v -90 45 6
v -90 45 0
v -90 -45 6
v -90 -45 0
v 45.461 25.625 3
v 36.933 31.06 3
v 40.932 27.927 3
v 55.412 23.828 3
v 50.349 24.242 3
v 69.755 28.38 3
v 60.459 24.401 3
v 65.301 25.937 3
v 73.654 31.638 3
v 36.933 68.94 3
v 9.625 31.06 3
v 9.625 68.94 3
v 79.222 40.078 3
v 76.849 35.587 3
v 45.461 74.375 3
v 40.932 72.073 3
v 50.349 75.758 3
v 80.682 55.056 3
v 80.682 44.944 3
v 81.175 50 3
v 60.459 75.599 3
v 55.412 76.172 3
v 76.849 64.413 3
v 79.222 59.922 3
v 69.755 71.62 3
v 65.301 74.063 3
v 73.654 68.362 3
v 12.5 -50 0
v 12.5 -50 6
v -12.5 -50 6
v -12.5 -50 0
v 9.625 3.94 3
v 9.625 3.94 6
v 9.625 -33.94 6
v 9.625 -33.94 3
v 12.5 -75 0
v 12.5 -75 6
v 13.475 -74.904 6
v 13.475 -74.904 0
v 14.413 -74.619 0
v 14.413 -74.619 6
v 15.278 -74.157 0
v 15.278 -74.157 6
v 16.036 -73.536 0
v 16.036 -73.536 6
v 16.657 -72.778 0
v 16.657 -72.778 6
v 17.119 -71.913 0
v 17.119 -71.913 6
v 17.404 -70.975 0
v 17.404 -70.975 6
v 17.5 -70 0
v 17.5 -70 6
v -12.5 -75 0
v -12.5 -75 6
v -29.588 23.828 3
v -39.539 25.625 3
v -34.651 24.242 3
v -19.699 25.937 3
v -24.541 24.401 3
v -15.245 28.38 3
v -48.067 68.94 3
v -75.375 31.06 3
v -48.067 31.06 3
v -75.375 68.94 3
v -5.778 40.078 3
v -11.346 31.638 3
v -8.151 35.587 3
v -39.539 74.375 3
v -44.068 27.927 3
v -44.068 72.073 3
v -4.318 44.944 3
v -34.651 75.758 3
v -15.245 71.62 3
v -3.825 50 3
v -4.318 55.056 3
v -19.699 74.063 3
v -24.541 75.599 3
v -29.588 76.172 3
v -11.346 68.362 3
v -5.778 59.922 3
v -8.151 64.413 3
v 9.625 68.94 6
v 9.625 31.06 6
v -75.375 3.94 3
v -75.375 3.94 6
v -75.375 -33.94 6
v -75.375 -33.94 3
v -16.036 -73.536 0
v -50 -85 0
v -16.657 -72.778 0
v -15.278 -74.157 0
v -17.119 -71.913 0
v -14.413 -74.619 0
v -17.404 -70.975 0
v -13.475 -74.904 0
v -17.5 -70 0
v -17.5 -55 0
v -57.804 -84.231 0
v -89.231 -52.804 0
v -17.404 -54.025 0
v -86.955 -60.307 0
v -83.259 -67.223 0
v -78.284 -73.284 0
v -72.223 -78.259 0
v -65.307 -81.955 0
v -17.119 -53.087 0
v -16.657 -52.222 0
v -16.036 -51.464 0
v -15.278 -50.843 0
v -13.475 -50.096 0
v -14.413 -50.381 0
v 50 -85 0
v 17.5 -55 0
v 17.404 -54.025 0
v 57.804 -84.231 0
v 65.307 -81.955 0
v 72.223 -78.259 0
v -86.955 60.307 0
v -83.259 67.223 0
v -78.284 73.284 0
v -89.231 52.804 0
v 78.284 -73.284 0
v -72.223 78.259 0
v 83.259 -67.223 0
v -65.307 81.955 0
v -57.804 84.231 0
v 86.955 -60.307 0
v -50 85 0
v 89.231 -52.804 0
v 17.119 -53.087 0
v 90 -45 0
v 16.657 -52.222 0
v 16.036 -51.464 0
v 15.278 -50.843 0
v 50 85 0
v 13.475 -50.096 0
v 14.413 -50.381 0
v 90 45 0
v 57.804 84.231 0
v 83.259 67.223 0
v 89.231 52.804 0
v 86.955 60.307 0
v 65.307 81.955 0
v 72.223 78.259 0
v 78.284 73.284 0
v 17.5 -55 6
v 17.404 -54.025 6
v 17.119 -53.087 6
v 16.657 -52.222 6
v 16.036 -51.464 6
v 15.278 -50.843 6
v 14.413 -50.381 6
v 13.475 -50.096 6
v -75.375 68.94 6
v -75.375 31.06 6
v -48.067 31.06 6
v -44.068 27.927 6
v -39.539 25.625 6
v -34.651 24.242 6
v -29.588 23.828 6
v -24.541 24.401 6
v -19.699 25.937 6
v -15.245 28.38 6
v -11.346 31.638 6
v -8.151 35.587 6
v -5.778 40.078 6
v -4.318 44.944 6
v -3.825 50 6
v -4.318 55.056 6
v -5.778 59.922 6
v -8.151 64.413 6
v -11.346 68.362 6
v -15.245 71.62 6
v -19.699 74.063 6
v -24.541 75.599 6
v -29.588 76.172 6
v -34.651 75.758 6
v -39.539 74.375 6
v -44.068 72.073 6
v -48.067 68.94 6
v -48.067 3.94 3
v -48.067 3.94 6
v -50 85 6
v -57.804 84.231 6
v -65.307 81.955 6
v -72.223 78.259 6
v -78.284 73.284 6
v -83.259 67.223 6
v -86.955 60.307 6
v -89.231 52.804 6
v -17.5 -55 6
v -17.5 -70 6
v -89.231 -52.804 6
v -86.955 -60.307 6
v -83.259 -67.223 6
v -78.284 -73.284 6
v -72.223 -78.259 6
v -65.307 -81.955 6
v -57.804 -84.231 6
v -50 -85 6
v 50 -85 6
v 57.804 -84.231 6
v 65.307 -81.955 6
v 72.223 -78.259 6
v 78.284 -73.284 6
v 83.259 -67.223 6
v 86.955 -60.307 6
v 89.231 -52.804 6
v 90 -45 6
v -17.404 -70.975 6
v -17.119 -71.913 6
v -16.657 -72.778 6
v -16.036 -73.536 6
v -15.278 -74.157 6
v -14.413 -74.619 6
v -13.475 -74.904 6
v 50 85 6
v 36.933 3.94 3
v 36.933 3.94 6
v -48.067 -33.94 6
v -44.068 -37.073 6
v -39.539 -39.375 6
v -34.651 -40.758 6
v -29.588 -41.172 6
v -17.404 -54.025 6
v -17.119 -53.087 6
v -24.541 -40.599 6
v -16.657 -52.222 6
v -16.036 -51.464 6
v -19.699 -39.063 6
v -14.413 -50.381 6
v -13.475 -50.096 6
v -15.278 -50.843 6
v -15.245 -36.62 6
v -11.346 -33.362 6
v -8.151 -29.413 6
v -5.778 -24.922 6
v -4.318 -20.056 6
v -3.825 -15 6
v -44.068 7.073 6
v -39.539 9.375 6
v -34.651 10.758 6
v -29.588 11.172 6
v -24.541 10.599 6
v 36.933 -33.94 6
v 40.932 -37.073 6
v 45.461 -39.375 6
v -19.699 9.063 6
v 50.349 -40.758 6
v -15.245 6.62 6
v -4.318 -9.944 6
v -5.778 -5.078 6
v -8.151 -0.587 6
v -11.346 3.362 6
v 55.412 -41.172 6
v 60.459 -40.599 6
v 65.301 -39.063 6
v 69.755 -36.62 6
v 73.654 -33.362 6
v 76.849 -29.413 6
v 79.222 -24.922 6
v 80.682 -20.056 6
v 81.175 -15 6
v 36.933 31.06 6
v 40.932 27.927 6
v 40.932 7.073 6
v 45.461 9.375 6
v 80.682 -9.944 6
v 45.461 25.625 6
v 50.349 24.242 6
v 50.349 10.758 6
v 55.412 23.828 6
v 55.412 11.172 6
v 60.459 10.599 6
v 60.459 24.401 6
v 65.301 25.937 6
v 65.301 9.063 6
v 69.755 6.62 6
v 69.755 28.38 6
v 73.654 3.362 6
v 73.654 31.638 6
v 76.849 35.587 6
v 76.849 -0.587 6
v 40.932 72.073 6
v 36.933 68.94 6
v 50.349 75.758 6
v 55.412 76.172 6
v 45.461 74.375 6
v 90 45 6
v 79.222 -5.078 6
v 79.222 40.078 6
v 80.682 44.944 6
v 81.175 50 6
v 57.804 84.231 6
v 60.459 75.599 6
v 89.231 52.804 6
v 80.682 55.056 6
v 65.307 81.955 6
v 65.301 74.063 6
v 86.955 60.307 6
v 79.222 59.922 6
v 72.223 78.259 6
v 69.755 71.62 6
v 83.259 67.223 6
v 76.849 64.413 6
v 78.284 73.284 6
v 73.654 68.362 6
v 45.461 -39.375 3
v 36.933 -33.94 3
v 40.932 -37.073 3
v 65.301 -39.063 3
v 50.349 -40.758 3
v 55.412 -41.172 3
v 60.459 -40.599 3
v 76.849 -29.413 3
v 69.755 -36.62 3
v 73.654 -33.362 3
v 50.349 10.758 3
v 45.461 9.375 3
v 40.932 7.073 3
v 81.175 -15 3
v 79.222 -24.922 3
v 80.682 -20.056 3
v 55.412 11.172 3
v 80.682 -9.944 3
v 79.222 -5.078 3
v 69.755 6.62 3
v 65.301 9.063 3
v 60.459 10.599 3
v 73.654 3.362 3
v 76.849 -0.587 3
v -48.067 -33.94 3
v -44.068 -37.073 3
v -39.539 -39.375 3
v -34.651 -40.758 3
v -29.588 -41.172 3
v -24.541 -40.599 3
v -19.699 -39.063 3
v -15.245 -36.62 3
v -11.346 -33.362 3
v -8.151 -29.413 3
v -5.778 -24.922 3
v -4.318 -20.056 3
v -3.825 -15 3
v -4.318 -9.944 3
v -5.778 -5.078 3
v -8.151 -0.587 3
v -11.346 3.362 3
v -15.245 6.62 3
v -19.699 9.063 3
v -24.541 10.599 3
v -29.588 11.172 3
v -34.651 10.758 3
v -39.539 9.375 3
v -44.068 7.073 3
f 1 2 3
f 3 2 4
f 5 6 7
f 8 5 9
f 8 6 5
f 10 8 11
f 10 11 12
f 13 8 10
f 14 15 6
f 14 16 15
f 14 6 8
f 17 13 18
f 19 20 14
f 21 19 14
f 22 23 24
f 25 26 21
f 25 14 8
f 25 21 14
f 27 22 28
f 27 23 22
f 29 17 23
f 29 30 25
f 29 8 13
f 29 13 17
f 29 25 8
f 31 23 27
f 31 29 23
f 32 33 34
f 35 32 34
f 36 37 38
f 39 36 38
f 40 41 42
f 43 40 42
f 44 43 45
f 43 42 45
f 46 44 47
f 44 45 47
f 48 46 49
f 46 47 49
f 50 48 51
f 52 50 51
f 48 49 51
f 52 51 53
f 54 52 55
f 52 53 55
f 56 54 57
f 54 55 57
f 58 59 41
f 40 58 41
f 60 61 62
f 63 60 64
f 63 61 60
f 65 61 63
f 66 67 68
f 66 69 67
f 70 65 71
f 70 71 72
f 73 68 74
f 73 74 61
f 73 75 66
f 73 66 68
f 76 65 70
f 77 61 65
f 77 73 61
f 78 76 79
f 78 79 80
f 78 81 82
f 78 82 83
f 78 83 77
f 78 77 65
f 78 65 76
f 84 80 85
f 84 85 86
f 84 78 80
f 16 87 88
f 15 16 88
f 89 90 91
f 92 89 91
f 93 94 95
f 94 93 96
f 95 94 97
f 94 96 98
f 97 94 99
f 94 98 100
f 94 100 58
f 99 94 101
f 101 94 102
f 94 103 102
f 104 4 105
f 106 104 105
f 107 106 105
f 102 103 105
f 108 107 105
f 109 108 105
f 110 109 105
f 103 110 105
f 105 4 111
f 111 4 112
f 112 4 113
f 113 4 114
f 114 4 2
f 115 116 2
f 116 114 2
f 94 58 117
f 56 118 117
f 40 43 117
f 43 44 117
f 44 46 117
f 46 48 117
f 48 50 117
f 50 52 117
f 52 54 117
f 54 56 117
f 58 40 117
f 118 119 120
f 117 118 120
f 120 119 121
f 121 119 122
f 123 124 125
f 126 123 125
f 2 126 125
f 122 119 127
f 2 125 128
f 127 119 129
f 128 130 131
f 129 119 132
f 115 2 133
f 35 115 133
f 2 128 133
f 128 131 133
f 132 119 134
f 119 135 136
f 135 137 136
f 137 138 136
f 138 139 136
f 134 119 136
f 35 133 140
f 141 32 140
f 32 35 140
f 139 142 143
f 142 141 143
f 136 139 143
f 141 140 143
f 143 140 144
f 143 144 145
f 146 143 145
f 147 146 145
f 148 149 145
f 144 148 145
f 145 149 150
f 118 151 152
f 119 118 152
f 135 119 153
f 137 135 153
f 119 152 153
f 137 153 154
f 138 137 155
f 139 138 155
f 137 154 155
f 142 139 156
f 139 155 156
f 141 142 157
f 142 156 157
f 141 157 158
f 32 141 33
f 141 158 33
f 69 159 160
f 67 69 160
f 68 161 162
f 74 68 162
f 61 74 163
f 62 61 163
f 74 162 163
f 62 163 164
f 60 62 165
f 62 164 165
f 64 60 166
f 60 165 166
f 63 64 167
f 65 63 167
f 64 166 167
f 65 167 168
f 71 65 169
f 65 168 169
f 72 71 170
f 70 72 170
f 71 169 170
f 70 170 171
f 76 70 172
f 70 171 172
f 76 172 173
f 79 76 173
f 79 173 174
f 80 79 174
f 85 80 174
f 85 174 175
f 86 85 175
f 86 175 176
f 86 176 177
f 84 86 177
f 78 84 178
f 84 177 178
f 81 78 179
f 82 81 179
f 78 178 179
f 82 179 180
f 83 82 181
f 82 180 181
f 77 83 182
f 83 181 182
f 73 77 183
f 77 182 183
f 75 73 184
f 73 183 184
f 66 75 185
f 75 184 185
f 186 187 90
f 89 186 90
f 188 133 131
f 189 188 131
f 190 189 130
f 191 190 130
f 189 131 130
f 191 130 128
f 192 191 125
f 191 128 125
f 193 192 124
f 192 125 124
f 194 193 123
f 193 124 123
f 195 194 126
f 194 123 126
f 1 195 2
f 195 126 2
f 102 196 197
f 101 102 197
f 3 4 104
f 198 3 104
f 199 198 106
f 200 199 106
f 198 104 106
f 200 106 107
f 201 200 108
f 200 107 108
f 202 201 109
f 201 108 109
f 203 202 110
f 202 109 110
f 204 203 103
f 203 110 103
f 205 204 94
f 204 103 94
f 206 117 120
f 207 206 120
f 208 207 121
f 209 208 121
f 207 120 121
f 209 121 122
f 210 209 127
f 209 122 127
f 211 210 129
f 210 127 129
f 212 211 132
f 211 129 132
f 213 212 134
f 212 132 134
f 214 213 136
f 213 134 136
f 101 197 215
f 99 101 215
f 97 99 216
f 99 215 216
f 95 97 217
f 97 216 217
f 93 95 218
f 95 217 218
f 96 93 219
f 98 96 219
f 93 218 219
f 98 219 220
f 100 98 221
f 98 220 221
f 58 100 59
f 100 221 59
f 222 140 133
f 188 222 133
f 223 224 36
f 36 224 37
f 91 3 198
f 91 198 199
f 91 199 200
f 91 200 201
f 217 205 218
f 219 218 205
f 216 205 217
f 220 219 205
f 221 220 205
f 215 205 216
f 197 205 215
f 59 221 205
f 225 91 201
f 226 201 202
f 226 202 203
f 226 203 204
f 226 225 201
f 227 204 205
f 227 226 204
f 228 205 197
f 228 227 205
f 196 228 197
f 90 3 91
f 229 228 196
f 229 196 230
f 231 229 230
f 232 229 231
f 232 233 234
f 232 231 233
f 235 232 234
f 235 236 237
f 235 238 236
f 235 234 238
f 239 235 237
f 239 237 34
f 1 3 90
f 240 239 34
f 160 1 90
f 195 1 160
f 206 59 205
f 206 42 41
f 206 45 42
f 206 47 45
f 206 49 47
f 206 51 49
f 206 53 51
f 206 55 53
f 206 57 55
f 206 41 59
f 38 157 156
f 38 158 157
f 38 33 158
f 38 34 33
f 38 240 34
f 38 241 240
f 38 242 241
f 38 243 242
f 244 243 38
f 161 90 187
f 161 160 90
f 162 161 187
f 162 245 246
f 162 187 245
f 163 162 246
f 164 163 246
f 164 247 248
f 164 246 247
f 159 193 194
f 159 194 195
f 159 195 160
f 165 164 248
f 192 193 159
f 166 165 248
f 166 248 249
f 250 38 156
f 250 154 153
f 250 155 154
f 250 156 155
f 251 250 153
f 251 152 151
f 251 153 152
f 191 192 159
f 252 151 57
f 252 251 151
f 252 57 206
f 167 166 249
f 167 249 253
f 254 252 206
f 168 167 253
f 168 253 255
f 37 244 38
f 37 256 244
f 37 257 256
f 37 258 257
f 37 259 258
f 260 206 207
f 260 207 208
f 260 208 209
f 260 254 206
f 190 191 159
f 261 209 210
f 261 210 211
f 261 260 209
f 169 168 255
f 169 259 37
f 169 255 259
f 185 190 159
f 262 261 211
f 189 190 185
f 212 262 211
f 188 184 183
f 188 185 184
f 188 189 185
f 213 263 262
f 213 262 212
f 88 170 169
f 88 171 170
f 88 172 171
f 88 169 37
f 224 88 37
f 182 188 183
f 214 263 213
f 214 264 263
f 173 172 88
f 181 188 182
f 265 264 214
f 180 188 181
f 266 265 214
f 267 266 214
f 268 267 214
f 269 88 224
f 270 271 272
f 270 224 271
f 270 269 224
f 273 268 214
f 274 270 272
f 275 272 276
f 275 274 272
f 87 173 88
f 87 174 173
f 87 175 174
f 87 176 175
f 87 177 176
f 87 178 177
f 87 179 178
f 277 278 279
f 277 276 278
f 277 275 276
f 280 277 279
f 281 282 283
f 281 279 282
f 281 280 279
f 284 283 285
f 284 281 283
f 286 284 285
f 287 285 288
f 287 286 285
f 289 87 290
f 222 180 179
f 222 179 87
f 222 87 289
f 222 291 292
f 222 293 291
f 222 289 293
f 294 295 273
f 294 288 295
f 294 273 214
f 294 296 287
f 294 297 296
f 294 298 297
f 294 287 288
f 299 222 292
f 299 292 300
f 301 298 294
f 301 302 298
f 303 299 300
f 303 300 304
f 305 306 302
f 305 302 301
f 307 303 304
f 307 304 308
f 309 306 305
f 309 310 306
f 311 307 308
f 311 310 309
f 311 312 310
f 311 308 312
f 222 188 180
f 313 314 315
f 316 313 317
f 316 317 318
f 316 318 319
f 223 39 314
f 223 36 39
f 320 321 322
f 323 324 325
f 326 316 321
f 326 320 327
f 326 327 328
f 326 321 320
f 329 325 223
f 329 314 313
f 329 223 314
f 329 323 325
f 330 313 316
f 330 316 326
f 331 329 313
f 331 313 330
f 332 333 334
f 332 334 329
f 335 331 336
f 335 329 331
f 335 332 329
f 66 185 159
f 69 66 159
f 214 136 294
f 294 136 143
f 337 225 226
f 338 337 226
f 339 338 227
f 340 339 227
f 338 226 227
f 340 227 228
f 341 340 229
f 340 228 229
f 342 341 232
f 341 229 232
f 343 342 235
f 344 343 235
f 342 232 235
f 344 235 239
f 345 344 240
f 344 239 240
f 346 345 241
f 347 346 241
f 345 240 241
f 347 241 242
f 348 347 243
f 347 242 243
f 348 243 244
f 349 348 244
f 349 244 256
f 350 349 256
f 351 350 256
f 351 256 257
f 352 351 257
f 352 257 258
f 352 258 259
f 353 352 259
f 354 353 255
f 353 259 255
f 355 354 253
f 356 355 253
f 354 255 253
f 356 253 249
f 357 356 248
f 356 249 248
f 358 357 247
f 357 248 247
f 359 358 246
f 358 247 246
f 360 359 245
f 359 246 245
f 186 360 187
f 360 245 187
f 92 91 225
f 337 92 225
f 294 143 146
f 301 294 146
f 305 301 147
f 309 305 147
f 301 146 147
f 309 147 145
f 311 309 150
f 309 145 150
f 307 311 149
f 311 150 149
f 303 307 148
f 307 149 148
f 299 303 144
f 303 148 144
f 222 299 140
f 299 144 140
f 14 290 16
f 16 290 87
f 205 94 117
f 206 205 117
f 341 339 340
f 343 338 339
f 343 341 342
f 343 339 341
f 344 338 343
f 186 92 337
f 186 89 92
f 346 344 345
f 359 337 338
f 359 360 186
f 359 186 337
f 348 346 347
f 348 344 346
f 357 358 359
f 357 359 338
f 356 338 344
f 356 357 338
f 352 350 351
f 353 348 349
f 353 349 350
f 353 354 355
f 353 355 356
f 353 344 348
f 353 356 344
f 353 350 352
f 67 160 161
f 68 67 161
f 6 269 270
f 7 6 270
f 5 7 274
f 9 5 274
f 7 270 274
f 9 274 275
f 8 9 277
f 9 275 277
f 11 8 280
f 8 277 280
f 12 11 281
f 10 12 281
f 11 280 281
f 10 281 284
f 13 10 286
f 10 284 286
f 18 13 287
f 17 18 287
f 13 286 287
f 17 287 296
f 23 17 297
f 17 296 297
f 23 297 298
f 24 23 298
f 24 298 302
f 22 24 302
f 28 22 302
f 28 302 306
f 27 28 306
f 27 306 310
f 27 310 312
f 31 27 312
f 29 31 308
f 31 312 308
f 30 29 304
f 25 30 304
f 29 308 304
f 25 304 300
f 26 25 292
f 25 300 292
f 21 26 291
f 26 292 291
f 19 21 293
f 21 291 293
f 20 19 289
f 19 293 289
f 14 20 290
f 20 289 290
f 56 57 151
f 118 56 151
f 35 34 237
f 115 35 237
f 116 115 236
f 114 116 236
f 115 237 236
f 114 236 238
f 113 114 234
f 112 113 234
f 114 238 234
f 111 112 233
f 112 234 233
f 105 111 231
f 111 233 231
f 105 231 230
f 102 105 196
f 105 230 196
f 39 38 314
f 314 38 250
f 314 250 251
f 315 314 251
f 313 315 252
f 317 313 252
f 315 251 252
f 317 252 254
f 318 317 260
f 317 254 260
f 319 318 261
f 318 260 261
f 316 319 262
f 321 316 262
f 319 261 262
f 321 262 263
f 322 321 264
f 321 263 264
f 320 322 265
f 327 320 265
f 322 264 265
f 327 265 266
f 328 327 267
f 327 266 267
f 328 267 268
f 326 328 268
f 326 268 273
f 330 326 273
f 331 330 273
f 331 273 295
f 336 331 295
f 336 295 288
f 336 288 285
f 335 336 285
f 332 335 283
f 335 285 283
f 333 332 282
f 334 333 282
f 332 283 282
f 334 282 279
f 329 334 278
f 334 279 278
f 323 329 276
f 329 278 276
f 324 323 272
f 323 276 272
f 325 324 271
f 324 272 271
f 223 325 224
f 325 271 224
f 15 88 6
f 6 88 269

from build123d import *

# Parameters (mm, degrees)
F1_DEPTH = 6
F3_DEPTH = 3
F5_DEPTH = 25


with BuildPart() as f1:
    # F0 (on Top) → F1 (new body)
    with BuildSketch(Plane.XY):
        with BuildLine():
            Line((0, 85), (-50, 85))
            ThreePointArc((-50, 85), (-78.284271, 73.284271), (-90, 45))
            Line((-90, 45), (-90, -45))
            ThreePointArc((-90, -45), (-78.284271, -73.284271), (-50, -85))
            Line((-50, -85), (50, -85))
            ThreePointArc((50, -85), (78.284271, -73.284271), (90, -45))
            Line((90, -45), (90, 0))
            Line((90, 0), (0, 0))
            Line((0, 0), (0, 85))
        make_face()
        with BuildLine():
            Line((50, 85), (0, 85))
            Line((0, 85), (0, 0))
            Line((0, 0), (90, 0))
            Line((90, 0), (90, 45))
            ThreePointArc((90, 45), (78.284271, 73.284271), (50, 85))
        make_face()
    extrude(amount=F1_DEPTH)

    # F2 (on face) → F3 (cut)
    with BuildSketch(Plane.XY.offset(6)):
        with BuildLine():
            Line((-75.375, 31.06), (-48.066738, 31.06))
            ThreePointArc((-48.066738, 31.06), (-3.825, 50), (-48.066738, 68.94))
            Line((-48.066738, 68.94), (-75.375, 68.94))
            Line((-75.375, 68.94), (-75.375, 31.06))
        make_face()
        with BuildLine():
            ThreePointArc((-45.939166, 63.94), (-8.825, 50), (-45.939166, 36.06))
            Line((-45.939166, 36.06), (-70.375, 36.06))
            Line((-70.375, 36.06), (-70.375, 63.94))
            Line((-70.375, 63.94), (-45.939166, 63.94))
        make_face(mode=Mode.SUBTRACT)
        with BuildLine():
            Line((9.625, 31.06), (36.933262, 31.06))
            ThreePointArc((36.933262, 31.06), (81.175, 50), (36.933262, 68.94))
            Line((36.933262, 68.94), (9.625, 68.94))
            Line((9.625, 68.94), (9.625, 31.06))
        make_face()
        with BuildLine():
            Line((9.625, -33.94), (36.933262, -33.94))
            ThreePointArc((36.933262, -33.94), (81.175, -15), (36.933262, 3.94))
            Line((36.933262, 3.94), (9.625, 3.94))
            Line((9.625, 3.94), (9.625, -33.94))
        make_face()
        with BuildLine():
            Line((-75.375, -33.94), (-48.066738, -33.94))
            ThreePointArc((-48.066738, -33.94), (-3.825, -15), (-48.066738, 3.94))
            Line((-48.066738, 3.94), (-75.375, 3.94))
            Line((-75.375, 3.94), (-75.375, -33.94))
        make_face()
        with BuildLine():
            Line((-70.375, 36.06), (-45.939166, 36.06))
            ThreePointArc((-45.939166, 36.06), (-8.825, 50), (-45.939166, 63.94))
            Line((-45.939166, 63.94), (-70.375, 63.94))
            Line((-70.375, 63.94), (-70.375, 36.06))
        make_face()
    extrude(amount=-F3_DEPTH, mode=Mode.SUBTRACT)

    # F4 (on face) → F5 (cut)
    with BuildSketch(Plane.XY.offset(6)):
        with BuildLine():
            ThreePointArc((17.5, -55), (16.035534, -51.464466), (12.5, -50))
            Line((12.5, -50), (-12.5, -50))
            ThreePointArc((-12.5, -50), (-16.035534, -51.464466), (-17.5, -55))
            Line((-17.5, -55), (-17.5, -70))
            ThreePointArc((-17.5, -70), (-16.035534, -73.535534), (-12.5, -75))
            Line((-12.5, -75), (12.5, -75))
            ThreePointArc((12.5, -75), (16.035534, -73.535534), (17.5, -70))
            Line((17.5, -70), (17.5, -55))
        make_face()
    extrude(amount=-F5_DEPTH, mode=Mode.SUBTRACT)


solid = f1.part
